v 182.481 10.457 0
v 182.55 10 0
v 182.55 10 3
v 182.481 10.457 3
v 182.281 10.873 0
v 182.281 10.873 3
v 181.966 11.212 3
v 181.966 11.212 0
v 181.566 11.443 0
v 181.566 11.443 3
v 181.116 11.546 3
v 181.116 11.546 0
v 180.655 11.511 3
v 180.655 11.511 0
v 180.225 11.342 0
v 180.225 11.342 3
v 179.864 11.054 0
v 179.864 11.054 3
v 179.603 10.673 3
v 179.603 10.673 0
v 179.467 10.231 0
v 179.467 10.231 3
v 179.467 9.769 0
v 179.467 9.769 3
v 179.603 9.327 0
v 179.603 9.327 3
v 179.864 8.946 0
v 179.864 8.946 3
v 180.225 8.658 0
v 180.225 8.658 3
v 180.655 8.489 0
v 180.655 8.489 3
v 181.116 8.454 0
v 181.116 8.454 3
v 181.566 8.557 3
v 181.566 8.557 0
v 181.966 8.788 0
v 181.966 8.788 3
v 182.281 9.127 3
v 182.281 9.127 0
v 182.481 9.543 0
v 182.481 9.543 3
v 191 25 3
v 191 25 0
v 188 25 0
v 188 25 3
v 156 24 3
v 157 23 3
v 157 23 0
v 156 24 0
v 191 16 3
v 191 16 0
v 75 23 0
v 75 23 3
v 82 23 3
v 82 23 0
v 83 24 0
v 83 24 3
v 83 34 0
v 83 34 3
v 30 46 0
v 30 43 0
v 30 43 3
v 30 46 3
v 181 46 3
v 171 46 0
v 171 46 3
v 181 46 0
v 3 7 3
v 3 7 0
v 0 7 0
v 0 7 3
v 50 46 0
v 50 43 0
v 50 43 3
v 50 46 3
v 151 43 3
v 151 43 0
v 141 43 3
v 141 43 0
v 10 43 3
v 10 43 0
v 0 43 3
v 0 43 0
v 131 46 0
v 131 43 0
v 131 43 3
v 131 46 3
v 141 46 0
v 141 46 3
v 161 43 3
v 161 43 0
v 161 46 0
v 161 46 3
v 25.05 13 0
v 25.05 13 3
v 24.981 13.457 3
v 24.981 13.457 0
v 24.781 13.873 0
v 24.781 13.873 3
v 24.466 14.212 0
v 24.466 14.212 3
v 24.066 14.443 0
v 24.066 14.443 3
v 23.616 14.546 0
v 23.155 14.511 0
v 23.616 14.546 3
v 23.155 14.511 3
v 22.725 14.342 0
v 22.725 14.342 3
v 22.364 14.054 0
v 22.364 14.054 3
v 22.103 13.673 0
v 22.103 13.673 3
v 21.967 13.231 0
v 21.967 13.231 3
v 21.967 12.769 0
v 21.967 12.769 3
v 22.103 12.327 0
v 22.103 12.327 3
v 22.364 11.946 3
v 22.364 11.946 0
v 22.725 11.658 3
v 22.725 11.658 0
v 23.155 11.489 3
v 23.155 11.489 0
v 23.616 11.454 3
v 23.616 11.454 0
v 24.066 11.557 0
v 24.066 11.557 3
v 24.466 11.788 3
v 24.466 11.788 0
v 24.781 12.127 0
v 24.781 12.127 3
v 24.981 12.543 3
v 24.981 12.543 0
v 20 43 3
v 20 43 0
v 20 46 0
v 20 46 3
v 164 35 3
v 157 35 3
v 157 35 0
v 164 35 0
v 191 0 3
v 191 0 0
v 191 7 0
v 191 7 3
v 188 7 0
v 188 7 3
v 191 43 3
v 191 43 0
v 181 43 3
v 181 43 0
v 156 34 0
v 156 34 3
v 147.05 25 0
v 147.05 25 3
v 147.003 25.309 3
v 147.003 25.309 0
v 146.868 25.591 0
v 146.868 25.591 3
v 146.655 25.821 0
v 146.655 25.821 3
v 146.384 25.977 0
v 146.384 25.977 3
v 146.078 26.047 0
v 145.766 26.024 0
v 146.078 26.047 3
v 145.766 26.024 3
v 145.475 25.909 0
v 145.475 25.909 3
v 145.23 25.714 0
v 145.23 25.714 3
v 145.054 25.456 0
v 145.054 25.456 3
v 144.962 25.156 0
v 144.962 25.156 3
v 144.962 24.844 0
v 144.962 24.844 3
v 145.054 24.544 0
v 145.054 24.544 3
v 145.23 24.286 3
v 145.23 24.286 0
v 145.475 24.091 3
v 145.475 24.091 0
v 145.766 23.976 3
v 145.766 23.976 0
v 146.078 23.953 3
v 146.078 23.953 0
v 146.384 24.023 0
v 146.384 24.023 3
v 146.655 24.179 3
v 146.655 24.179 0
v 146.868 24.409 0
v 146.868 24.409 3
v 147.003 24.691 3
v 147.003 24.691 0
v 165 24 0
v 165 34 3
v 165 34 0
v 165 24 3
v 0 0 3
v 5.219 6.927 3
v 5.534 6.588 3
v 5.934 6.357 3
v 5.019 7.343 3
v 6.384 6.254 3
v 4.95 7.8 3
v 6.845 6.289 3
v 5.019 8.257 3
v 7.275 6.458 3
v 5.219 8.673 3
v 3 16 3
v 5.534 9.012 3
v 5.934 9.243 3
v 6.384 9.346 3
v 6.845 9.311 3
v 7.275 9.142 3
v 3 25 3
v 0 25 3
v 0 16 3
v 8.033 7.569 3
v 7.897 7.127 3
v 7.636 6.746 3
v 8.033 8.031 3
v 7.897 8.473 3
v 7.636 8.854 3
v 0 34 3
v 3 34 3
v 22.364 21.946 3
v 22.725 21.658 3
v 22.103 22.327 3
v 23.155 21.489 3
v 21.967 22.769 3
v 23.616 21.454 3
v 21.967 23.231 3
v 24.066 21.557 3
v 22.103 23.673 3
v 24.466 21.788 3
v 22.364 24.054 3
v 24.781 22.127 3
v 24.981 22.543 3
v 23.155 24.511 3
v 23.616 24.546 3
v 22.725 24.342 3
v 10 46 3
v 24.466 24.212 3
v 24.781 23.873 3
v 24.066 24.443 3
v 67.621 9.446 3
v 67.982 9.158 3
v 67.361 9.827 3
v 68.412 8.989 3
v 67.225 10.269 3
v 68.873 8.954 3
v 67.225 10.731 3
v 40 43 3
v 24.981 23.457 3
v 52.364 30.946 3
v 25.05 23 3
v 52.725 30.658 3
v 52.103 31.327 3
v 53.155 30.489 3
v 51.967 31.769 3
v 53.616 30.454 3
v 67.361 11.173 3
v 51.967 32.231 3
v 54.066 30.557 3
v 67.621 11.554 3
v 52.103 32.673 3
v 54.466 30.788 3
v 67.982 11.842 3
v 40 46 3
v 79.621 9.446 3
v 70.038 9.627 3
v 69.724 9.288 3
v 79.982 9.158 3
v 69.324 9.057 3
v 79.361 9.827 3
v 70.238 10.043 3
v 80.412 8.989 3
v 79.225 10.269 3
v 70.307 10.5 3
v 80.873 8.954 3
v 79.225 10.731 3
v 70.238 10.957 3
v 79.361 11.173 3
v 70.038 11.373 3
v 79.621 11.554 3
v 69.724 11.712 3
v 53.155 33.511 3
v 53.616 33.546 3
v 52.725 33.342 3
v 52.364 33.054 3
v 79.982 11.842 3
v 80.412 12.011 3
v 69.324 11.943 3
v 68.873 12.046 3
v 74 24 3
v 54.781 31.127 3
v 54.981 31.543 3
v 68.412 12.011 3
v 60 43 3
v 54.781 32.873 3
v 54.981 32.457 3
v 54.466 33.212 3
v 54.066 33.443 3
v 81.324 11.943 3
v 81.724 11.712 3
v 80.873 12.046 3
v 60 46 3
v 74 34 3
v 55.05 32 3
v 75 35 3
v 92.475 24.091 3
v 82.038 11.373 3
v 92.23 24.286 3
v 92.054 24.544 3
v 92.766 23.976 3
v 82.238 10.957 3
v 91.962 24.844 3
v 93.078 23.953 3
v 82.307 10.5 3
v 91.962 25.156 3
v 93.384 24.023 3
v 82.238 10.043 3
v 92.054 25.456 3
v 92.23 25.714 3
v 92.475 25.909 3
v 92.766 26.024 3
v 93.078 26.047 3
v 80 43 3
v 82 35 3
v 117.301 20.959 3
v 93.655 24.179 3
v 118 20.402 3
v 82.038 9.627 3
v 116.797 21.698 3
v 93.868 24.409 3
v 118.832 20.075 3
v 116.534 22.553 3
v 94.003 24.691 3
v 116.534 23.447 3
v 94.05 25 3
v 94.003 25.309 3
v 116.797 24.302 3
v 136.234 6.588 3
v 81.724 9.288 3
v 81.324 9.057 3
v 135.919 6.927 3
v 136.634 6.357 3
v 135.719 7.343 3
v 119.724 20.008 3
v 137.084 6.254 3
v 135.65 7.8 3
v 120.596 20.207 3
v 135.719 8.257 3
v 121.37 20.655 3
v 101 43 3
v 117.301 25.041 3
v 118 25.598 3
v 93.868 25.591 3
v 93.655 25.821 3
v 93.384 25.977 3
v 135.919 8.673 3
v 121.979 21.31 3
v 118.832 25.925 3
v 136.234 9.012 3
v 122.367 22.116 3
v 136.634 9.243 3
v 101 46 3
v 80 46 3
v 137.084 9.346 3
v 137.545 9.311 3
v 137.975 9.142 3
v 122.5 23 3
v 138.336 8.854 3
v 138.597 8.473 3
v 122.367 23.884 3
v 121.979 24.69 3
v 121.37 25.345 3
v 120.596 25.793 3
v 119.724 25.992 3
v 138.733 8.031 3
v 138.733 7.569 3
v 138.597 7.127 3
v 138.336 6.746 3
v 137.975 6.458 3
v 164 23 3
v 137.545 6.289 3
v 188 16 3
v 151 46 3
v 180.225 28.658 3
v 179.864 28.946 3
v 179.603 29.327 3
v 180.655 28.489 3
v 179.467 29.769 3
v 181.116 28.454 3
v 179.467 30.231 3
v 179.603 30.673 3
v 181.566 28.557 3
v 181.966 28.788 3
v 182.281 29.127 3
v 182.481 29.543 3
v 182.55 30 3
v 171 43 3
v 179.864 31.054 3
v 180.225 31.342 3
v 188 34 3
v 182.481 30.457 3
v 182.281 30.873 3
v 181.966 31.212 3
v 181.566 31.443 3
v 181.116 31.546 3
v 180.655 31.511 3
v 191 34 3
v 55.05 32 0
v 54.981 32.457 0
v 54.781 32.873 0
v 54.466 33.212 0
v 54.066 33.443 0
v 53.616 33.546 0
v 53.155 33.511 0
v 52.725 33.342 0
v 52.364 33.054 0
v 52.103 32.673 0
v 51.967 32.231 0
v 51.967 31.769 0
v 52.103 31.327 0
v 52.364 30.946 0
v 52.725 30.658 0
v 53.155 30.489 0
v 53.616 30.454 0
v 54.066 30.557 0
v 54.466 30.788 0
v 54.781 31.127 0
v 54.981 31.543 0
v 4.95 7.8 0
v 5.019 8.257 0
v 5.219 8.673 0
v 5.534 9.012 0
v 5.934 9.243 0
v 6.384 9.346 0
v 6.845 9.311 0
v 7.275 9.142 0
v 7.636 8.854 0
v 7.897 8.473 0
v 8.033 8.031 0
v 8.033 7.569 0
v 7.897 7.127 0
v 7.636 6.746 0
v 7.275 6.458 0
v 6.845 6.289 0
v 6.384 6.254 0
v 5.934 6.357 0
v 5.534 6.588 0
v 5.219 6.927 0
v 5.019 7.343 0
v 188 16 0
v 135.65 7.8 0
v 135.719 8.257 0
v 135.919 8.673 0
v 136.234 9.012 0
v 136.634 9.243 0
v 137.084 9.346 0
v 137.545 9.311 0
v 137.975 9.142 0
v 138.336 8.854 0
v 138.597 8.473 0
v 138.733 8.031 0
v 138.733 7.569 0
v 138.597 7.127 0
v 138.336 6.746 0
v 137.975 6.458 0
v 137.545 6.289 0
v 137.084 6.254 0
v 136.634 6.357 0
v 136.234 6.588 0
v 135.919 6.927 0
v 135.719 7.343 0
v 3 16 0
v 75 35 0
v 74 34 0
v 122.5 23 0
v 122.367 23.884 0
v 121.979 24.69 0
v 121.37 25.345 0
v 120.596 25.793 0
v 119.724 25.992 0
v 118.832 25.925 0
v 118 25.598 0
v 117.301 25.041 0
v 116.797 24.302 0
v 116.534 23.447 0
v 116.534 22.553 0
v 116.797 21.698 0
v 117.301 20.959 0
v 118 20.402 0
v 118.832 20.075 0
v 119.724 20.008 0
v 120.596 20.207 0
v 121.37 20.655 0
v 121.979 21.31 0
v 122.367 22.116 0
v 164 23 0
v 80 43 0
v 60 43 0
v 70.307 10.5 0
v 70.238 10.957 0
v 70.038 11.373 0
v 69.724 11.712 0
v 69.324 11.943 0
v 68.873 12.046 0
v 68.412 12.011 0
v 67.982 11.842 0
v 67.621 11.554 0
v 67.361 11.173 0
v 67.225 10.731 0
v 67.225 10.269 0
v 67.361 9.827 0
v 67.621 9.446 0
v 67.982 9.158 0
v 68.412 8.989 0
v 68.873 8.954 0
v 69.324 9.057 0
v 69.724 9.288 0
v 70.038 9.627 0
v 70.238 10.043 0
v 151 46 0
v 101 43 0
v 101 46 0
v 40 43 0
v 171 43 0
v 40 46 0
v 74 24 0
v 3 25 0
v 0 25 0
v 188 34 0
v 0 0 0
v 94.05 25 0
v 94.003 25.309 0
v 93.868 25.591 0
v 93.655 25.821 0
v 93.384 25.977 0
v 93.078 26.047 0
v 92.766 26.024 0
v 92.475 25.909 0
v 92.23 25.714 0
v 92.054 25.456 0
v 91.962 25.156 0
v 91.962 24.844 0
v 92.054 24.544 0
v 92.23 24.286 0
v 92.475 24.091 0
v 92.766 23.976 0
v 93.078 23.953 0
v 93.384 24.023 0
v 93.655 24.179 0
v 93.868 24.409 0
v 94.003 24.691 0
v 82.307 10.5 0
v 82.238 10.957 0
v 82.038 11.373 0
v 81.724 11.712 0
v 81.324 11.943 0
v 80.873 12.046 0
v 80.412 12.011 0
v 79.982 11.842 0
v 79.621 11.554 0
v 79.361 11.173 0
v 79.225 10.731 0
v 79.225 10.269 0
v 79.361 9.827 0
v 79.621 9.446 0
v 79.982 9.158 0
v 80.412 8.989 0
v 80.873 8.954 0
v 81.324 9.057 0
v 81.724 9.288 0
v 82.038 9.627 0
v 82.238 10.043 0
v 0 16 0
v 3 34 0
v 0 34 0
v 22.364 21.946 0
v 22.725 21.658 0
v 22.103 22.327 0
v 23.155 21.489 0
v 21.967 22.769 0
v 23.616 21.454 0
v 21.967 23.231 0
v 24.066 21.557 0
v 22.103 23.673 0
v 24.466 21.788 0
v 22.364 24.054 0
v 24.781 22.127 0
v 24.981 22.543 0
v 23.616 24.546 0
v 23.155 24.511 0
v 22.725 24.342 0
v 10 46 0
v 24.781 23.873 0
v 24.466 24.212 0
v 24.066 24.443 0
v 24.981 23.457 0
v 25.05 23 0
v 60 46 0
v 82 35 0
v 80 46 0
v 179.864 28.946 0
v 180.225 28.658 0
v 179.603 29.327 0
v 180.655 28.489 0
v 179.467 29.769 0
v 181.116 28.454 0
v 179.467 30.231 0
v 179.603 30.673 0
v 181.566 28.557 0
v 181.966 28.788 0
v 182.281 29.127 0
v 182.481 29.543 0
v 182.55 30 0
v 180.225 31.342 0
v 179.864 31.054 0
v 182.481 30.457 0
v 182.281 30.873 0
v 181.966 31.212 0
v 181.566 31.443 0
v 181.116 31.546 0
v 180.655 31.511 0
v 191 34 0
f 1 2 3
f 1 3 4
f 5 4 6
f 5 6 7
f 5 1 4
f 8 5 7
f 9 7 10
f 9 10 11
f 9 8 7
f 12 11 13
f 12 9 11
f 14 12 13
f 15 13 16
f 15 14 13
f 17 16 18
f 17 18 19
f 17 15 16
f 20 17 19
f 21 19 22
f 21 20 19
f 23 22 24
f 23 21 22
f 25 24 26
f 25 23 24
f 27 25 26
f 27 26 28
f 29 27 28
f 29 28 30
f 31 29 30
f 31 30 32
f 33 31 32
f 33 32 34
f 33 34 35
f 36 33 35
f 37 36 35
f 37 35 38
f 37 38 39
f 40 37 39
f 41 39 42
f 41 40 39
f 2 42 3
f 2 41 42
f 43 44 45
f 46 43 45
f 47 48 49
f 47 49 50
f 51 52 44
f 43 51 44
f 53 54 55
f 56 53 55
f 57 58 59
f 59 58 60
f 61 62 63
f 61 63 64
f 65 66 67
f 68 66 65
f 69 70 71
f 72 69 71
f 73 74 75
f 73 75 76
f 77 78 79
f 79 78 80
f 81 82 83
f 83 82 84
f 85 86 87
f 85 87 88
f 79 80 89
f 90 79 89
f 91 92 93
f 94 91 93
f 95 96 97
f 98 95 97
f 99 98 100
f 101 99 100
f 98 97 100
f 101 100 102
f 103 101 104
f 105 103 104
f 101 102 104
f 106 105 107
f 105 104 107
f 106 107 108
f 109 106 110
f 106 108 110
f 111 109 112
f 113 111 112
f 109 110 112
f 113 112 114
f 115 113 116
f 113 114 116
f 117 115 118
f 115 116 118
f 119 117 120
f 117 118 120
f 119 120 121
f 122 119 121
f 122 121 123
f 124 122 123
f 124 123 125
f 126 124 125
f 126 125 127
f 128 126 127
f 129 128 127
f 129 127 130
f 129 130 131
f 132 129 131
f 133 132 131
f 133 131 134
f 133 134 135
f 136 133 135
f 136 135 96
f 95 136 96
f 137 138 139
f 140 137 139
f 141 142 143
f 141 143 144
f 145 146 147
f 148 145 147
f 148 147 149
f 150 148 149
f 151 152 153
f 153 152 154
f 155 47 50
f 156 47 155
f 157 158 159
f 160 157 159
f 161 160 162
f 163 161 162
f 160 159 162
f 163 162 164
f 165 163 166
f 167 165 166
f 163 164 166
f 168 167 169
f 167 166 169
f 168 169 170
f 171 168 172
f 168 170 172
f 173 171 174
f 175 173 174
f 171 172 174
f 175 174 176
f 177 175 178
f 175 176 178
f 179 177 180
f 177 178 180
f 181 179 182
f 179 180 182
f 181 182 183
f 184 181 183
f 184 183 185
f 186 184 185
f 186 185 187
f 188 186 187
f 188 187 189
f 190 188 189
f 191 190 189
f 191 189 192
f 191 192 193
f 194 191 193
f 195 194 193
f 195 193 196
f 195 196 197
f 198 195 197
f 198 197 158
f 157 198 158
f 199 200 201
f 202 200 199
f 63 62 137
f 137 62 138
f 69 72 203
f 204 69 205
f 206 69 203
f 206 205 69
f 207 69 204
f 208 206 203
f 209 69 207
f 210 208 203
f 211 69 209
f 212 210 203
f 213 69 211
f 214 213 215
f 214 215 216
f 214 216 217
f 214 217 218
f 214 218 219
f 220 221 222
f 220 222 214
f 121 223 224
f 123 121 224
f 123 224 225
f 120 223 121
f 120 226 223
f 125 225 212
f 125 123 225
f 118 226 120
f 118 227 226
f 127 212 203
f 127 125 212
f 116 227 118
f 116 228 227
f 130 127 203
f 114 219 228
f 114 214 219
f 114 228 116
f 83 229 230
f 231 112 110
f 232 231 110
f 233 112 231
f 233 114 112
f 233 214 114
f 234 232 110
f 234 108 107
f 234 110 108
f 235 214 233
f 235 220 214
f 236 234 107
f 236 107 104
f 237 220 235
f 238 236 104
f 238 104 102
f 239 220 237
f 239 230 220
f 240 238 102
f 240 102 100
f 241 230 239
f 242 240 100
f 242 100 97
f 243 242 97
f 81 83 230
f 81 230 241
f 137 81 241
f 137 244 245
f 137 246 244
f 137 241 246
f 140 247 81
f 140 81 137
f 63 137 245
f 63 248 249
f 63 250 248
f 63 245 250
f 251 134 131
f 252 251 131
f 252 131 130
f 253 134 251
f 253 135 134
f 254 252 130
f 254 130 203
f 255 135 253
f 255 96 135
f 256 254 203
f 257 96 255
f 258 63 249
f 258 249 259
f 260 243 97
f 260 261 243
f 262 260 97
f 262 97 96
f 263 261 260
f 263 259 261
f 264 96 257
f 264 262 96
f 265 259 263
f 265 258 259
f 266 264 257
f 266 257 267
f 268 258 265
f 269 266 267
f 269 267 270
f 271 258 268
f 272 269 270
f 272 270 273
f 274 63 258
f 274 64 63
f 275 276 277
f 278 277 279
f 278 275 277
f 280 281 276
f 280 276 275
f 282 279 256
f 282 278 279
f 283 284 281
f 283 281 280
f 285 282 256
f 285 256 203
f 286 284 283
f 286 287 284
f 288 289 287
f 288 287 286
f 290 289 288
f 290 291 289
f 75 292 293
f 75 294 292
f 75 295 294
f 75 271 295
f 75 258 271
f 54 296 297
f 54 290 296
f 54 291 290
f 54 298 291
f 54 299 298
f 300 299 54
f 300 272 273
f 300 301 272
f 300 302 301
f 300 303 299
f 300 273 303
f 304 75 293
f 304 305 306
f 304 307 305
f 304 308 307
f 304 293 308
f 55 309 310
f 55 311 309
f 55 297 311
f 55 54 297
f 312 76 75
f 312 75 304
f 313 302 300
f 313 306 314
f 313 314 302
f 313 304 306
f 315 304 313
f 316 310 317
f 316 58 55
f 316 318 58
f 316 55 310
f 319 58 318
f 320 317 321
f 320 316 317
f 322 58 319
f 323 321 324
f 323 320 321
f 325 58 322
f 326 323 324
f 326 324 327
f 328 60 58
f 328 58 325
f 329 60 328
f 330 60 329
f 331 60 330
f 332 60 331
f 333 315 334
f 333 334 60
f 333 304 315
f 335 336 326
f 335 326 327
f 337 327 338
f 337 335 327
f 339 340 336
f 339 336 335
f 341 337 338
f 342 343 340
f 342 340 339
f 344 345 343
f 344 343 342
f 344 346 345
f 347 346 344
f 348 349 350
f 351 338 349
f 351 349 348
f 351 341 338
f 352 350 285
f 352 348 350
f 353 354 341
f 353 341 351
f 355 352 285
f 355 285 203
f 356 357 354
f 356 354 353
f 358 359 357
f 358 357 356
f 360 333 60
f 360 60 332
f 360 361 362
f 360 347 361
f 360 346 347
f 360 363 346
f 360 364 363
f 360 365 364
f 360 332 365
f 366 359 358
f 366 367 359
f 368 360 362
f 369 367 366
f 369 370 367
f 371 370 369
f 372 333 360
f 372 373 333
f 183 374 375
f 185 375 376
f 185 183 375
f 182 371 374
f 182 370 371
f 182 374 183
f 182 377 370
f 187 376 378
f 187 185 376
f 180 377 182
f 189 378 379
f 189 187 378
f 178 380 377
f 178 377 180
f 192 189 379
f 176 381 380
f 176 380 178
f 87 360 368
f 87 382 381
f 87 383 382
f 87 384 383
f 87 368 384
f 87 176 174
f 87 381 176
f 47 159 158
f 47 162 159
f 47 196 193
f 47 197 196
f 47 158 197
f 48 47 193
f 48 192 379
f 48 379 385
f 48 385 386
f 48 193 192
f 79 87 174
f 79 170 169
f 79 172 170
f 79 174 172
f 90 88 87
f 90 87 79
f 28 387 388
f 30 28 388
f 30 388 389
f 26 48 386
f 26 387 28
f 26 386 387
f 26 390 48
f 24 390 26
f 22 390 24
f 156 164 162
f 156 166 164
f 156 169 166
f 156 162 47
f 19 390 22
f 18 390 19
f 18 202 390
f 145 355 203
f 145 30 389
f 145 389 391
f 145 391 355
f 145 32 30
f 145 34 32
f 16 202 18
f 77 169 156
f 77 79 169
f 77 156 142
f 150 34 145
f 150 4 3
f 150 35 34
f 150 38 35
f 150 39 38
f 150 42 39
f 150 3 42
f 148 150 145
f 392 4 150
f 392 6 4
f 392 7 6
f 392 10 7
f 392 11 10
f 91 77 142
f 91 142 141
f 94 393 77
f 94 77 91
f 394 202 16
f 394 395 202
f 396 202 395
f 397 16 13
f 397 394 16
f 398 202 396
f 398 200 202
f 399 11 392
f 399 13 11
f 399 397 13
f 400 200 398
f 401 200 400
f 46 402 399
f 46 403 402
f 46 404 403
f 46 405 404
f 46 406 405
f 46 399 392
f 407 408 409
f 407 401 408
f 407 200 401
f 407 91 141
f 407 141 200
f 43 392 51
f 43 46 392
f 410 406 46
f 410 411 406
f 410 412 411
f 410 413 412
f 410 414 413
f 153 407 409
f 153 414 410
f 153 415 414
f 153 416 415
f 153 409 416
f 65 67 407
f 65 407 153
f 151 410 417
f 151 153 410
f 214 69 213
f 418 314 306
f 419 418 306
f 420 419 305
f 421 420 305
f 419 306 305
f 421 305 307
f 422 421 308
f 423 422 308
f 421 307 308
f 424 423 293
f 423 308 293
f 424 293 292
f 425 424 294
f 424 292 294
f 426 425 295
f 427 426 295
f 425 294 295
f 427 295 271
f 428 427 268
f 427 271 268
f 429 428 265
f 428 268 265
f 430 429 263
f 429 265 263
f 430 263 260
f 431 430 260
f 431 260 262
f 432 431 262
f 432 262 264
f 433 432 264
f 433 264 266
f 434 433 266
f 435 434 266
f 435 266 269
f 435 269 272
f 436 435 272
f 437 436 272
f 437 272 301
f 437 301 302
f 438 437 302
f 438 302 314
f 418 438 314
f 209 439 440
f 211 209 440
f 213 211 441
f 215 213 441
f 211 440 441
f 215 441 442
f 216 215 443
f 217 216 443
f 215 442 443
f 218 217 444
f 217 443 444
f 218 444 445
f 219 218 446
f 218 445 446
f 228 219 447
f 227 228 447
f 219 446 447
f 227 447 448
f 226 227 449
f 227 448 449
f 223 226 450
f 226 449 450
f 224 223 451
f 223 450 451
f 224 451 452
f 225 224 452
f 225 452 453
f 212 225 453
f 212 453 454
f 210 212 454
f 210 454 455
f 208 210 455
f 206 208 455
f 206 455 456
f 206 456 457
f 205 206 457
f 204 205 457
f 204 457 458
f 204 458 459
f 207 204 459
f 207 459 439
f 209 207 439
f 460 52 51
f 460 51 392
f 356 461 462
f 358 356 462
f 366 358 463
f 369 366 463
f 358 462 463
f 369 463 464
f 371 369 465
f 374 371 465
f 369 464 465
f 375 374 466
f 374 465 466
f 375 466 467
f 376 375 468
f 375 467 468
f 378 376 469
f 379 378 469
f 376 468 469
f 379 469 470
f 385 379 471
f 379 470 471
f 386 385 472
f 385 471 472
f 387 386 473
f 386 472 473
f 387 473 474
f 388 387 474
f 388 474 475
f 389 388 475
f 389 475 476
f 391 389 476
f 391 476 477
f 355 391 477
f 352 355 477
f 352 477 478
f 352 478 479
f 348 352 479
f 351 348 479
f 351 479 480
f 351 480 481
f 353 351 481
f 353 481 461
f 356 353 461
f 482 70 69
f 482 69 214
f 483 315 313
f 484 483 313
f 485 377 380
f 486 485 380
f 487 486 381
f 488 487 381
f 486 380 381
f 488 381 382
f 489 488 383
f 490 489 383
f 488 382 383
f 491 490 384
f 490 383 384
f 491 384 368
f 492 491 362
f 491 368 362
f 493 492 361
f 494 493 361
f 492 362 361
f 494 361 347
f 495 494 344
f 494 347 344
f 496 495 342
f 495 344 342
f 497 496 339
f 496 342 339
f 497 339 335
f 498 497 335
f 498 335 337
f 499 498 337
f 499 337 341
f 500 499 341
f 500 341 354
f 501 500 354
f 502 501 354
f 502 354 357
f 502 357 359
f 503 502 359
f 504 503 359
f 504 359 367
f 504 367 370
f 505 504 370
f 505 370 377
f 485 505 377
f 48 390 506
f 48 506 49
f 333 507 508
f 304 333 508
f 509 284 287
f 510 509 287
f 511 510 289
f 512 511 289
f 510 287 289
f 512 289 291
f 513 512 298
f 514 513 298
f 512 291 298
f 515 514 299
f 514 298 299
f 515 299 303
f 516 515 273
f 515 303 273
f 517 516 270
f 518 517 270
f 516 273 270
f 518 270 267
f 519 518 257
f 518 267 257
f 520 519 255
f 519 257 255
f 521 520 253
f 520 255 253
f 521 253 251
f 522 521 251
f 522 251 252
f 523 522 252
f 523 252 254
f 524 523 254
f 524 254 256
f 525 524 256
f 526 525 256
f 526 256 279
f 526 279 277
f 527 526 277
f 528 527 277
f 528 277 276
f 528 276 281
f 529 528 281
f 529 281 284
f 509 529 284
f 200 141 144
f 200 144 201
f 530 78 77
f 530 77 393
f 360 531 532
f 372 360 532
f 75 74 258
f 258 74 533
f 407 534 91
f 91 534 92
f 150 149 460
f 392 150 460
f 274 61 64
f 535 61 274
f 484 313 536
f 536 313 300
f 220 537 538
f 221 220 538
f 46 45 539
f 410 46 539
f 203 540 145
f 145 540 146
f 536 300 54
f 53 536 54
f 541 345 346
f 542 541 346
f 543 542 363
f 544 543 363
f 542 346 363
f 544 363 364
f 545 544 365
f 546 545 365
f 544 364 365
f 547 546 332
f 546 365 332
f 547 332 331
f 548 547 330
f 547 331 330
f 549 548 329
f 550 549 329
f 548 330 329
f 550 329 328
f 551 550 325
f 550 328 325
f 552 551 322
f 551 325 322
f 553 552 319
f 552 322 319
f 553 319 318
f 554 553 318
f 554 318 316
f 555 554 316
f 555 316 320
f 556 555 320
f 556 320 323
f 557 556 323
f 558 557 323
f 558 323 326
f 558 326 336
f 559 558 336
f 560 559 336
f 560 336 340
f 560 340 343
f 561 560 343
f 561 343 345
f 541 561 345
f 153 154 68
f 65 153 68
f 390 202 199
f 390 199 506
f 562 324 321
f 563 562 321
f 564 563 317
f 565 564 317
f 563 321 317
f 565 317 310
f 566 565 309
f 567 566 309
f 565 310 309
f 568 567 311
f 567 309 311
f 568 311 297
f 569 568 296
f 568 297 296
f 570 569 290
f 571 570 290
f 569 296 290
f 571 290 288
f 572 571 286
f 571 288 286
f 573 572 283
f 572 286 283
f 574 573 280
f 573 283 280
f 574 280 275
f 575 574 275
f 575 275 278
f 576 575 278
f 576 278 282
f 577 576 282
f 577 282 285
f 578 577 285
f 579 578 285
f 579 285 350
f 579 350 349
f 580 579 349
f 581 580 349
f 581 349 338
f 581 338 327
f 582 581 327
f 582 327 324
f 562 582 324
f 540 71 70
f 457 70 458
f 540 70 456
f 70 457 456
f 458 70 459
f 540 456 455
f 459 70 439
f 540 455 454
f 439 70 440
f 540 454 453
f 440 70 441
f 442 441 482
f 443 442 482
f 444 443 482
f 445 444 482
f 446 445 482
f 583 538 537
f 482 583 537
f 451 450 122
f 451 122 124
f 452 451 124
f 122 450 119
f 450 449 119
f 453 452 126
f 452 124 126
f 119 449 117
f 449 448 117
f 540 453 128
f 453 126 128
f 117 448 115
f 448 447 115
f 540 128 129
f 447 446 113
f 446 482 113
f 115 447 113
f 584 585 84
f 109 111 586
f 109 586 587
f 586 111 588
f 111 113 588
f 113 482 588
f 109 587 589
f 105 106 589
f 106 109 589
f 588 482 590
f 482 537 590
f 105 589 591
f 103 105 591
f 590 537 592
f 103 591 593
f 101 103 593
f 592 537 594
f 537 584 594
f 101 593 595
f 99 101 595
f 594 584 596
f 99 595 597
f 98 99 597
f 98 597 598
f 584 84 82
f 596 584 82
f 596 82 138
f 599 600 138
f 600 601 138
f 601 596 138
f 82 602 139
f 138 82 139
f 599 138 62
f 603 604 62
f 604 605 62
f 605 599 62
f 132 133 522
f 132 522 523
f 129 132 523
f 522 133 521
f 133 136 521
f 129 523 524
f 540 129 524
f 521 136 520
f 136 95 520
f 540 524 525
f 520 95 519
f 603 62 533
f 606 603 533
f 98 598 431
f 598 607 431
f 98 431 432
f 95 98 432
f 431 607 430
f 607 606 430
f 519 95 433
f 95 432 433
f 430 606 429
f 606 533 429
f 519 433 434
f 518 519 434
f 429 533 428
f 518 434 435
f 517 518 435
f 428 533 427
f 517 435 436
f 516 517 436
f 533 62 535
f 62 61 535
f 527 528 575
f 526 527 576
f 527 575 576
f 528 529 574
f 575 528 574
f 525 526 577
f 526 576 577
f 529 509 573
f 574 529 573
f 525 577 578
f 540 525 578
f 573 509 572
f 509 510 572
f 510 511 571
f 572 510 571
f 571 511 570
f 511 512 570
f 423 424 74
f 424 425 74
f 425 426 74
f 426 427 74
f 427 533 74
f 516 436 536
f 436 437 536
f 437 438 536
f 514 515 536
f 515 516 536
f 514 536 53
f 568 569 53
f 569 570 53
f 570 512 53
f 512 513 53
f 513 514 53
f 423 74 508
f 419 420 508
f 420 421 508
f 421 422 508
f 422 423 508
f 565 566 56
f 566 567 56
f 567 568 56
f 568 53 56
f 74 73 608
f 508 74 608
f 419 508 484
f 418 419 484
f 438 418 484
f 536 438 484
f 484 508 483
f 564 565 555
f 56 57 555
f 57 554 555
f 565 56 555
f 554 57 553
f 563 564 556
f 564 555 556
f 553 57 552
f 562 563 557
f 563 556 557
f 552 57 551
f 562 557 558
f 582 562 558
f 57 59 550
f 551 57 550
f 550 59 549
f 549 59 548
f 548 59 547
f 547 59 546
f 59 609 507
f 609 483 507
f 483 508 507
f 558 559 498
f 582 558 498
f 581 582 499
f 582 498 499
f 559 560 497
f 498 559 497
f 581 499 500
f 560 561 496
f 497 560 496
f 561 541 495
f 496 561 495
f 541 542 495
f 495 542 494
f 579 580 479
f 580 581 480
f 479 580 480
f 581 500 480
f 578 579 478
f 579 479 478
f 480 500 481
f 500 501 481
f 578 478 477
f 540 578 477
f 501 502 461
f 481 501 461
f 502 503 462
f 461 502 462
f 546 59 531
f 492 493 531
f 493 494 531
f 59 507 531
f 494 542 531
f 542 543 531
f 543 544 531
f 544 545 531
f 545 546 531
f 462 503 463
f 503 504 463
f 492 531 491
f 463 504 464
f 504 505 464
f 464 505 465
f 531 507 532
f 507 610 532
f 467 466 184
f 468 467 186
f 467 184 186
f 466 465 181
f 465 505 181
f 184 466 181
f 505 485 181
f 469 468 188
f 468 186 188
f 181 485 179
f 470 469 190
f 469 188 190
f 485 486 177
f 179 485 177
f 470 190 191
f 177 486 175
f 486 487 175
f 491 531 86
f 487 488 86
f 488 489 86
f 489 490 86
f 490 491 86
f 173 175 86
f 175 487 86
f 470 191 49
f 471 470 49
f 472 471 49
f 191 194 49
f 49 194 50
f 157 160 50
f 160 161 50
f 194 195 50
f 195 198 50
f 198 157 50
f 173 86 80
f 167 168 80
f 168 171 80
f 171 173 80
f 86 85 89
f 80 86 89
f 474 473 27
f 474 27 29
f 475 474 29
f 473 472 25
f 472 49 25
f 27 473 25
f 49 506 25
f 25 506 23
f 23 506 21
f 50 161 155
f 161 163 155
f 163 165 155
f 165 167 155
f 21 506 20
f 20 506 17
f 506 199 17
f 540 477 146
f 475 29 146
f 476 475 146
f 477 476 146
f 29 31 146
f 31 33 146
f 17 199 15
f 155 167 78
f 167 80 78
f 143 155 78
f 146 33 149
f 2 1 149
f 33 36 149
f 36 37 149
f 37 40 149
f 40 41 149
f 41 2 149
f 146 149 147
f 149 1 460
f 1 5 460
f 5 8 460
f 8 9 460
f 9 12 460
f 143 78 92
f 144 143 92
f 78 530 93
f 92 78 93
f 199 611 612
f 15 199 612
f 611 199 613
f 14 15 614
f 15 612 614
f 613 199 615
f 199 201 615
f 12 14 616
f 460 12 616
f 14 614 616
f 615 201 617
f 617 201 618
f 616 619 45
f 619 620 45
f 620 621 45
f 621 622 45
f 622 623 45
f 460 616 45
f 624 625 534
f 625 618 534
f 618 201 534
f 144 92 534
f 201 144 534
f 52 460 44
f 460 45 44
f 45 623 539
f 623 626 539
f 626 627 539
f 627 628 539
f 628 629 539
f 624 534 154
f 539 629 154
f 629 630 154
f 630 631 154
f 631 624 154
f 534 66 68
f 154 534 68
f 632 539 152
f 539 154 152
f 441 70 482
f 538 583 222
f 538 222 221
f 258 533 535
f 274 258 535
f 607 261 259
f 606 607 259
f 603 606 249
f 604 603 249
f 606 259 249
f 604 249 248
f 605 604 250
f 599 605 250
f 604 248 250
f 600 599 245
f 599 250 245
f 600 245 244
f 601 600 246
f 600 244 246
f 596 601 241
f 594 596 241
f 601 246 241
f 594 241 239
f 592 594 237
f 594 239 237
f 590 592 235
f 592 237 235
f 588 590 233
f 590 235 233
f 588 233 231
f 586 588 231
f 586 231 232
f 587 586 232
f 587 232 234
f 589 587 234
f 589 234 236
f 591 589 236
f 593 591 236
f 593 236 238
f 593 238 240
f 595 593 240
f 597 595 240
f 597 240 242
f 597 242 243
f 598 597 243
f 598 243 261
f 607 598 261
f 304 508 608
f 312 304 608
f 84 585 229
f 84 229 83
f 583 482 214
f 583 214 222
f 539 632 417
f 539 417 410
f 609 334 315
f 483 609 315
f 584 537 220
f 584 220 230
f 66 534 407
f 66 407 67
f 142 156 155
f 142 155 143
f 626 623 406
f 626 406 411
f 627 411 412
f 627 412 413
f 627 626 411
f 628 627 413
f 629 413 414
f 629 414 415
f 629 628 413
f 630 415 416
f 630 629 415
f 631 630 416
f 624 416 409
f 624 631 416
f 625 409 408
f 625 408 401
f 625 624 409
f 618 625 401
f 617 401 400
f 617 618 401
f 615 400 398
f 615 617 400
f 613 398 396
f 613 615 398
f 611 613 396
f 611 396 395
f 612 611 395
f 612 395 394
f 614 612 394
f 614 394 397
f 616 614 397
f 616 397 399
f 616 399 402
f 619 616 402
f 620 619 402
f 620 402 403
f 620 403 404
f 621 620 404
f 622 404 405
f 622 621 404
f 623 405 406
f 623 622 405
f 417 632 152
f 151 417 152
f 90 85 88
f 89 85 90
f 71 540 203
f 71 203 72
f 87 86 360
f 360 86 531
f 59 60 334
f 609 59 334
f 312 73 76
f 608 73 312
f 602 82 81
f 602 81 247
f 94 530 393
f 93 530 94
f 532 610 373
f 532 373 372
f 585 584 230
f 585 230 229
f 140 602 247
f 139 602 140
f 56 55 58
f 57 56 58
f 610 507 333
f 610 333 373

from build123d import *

# Parameters (mm, degrees)
SKETCH1_W           = 191
SKETCH1_H           = 46
SKETCH1_R           = 1.549999948
BOSS_EXTRUDE1_DEPTH = 3
CUT_EXTRUDE1_REACH  = 5
SKETCH4_W           = 10
SKETCH4_H           = 3
SKETCH4_W_2         = 20
SKETCH4_W_3         = 30
CUT_EXTRUDE2_REACH  = 5
SKETCH5_W           = 3
SKETCH5_H           = 9
CUT_EXTRUDE3_REACH  = 5
SKETCH6_W           = 3
SKETCH6_H           = 9
CUT_EXTRUDE4_REACH  = 5
SKETCH7_R           = 3
CUT_EXTRUDE5_REACH  = 5
SKETCH8_R           = 1.55
CUT_EXTRUDE6_REACH  = 5
SKETCH9_R           = 1.55
CUT_EXTRUDE7_REACH  = 5
SKETCH10_R          = 1.05
CUT_EXTRUDE8_REACH  = 5
SKETCH11_R          = 1.05


with BuildPart() as part:
    # Sketch1 → Boss-Extrude1 (new body)
    with BuildSketch(Plane.XY):
        with Locations((95.5, 23)):
            Rectangle(SKETCH1_W, SKETCH1_H)
        with Locations((181, 30)):
            Circle(SKETCH1_R, mode=Mode.SUBTRACT)
        with Locations((181, 10)):
            Circle(SKETCH1_R, mode=Mode.SUBTRACT)
    extrude(amount=BOSS_EXTRUDE1_DEPTH)

    # Sketch4 → Cut-Extrude1 (cut, up to next)
    with BuildSketch(Plane(origin=(0, 0, 0), x_dir=(-1, 0, 0), z_dir=(0, 0, -1)), mode=Mode.PRIVATE) as cut_extrude1_sk1:
        with Locations((-5, 44.5)):
            Rectangle(SKETCH4_W, SKETCH4_H)
    cut_extrude1_tool1 = extrude(cut_extrude1_sk1.sketch, amount=-CUT_EXTRUDE1_REACH, mode=Mode.PRIVATE) & part.part
    add(cut_extrude1_tool1.solids().sort_by_distance((5, 44.5, 0))[0], mode=Mode.SUBTRACT)
    # Sketch4 → Cut-Extrude1 (cut, up to next)
    with BuildSketch(Plane(origin=(0, 0, 0), x_dir=(-1, 0, 0), z_dir=(0, 0, -1)), mode=Mode.PRIVATE) as cut_extrude1_sk2:
        with Locations((-25, 44.5)):
            Rectangle(SKETCH4_W, SKETCH4_H)
    cut_extrude1_tool2 = extrude(cut_extrude1_sk2.sketch, amount=-CUT_EXTRUDE1_REACH, mode=Mode.PRIVATE) & part.part
    add(cut_extrude1_tool2.solids().sort_by_distance((25, 44.5, 0))[0], mode=Mode.SUBTRACT)
    # Sketch4 → Cut-Extrude1 (cut, up to next)
    with BuildSketch(Plane(origin=(0, 0, 0), x_dir=(-1, 0, 0), z_dir=(0, 0, -1)), mode=Mode.PRIVATE) as cut_extrude1_sk3:
        with Locations((-45, 44.5)):
            Rectangle(SKETCH4_W, SKETCH4_H)
    cut_extrude1_tool3 = extrude(cut_extrude1_sk3.sketch, amount=-CUT_EXTRUDE1_REACH, mode=Mode.PRIVATE) & part.part
    add(cut_extrude1_tool3.solids().sort_by_distance((45, 44.5, 0))[0], mode=Mode.SUBTRACT)
    # Sketch4 → Cut-Extrude1 (cut, up to next)
    with BuildSketch(Plane(origin=(0, 0, 0), x_dir=(-1, 0, 0), z_dir=(0, 0, -1)), mode=Mode.PRIVATE) as cut_extrude1_sk4:
        with Locations((-70, 44.5)):
            Rectangle(SKETCH4_W_2, SKETCH4_H)
    cut_extrude1_tool4 = extrude(cut_extrude1_sk4.sketch, amount=-CUT_EXTRUDE1_REACH, mode=Mode.PRIVATE) & part.part
    add(cut_extrude1_tool4.solids().sort_by_distance((70, 44.5, 0))[0], mode=Mode.SUBTRACT)
    # Sketch4 → Cut-Extrude1 (cut, up to next)
    with BuildSketch(Plane(origin=(0, 0, 0), x_dir=(-1, 0, 0), z_dir=(0, 0, -1)), mode=Mode.PRIVATE) as cut_extrude1_sk5:
        with Locations((-116, 44.5)):
            Rectangle(SKETCH4_W_3, SKETCH4_H)
    cut_extrude1_tool5 = extrude(cut_extrude1_sk5.sketch, amount=-CUT_EXTRUDE1_REACH, mode=Mode.PRIVATE) & part.part
    add(cut_extrude1_tool5.solids().sort_by_distance((116, 44.5, 0))[0], mode=Mode.SUBTRACT)
    # Sketch4 → Cut-Extrude1 (cut, up to next)
    with BuildSketch(Plane(origin=(0, 0, 0), x_dir=(-1, 0, 0), z_dir=(0, 0, -1)), mode=Mode.PRIVATE) as cut_extrude1_sk6:
        with Locations((-146, 44.5)):
            Rectangle(SKETCH4_W, SKETCH4_H)
    cut_extrude1_tool6 = extrude(cut_extrude1_sk6.sketch, amount=-CUT_EXTRUDE1_REACH, mode=Mode.PRIVATE) & part.part
    add(cut_extrude1_tool6.solids().sort_by_distance((146, 44.5, 0))[0], mode=Mode.SUBTRACT)
    # Sketch4 → Cut-Extrude1 (cut, up to next)
    with BuildSketch(Plane(origin=(0, 0, 0), x_dir=(-1, 0, 0), z_dir=(0, 0, -1)), mode=Mode.PRIVATE) as cut_extrude1_sk7:
        with Locations((-166, 44.5)):
            Rectangle(SKETCH4_W, SKETCH4_H)
    cut_extrude1_tool7 = extrude(cut_extrude1_sk7.sketch, amount=-CUT_EXTRUDE1_REACH, mode=Mode.PRIVATE) & part.part
    add(cut_extrude1_tool7.solids().sort_by_distance((166, 44.5, 0))[0], mode=Mode.SUBTRACT)
    # Sketch4 → Cut-Extrude1 (cut, up to next)
    with BuildSketch(Plane(origin=(0, 0, 0), x_dir=(-1, 0, 0), z_dir=(0, 0, -1)), mode=Mode.PRIVATE) as cut_extrude1_sk8:
        with Locations((-186, 44.5)):
            Rectangle(SKETCH4_W, SKETCH4_H)
    cut_extrude1_tool8 = extrude(cut_extrude1_sk8.sketch, amount=-CUT_EXTRUDE1_REACH, mode=Mode.PRIVATE) & part.part
    add(cut_extrude1_tool8.solids().sort_by_distance((186, 44.5, 0))[0], mode=Mode.SUBTRACT)

    # Sketch5 → Cut-Extrude2 (cut, up to next)
    with BuildSketch(Plane(origin=(0, 0, 0), x_dir=(-1, 0, 0), z_dir=(0, 0, -1)), mode=Mode.PRIVATE) as cut_extrude2_sk1:
        with Locations((-1.5, 29.5)):
            Rectangle(SKETCH5_W, SKETCH5_H)
    cut_extrude2_tool1 = extrude(cut_extrude2_sk1.sketch, amount=-CUT_EXTRUDE2_REACH, mode=Mode.PRIVATE) & part.part
    add(cut_extrude2_tool1.solids().sort_by_distance((1.5, 29.5, 0))[0], mode=Mode.SUBTRACT)
    # Sketch5 → Cut-Extrude2 (cut, up to next)
    with BuildSketch(Plane(origin=(0, 0, 0), x_dir=(-1, 0, 0), z_dir=(0, 0, -1)), mode=Mode.PRIVATE) as cut_extrude2_sk2:
        with Locations((-1.5, 11.5)):
            Rectangle(SKETCH5_W, SKETCH5_H)
    cut_extrude2_tool2 = extrude(cut_extrude2_sk2.sketch, amount=-CUT_EXTRUDE2_REACH, mode=Mode.PRIVATE) & part.part
    add(cut_extrude2_tool2.solids().sort_by_distance((1.5, 11.5, 0))[0], mode=Mode.SUBTRACT)

    # Sketch6 → Cut-Extrude3 (cut, up to next)
    with BuildSketch(Plane(origin=(0, 0, 0), x_dir=(-1, 0, 0), z_dir=(0, 0, -1)), mode=Mode.PRIVATE) as cut_extrude3_sk1:
        with Locations((-189.5, 29.5)):
            Rectangle(SKETCH6_W, SKETCH6_H)
    cut_extrude3_tool1 = extrude(cut_extrude3_sk1.sketch, amount=-CUT_EXTRUDE3_REACH, mode=Mode.PRIVATE) & part.part
    add(cut_extrude3_tool1.solids().sort_by_distance((189.5, 29.5, 0))[0], mode=Mode.SUBTRACT)
    # Sketch6 → Cut-Extrude3 (cut, up to next)
    with BuildSketch(Plane(origin=(0, 0, 0), x_dir=(-1, 0, 0), z_dir=(0, 0, -1)), mode=Mode.PRIVATE) as cut_extrude3_sk2:
        with Locations((-189.5, 11.5)):
            Rectangle(SKETCH6_W, SKETCH6_H)
    cut_extrude3_tool2 = extrude(cut_extrude3_sk2.sketch, amount=-CUT_EXTRUDE3_REACH, mode=Mode.PRIVATE) & part.part
    add(cut_extrude3_tool2.solids().sort_by_distance((189.5, 11.5, 0))[0], mode=Mode.SUBTRACT)

    # Sketch7 → Cut-Extrude4 (cut, up to next)
    with BuildSketch(Plane.XY.offset(3), mode=Mode.PRIVATE) as cut_extrude4_sk1:
        with Locations((119.5, 23)):
            Circle(SKETCH7_R)
    cut_extrude4_tool1 = extrude(cut_extrude4_sk1.sketch, amount=-CUT_EXTRUDE4_REACH, mode=Mode.PRIVATE) & part.part
    add(cut_extrude4_tool1.solids().sort_by_distance((119.5, 23, 3))[0], mode=Mode.SUBTRACT)

    # Sketch8 → Cut-Extrude5 (cut, up to next)
    with BuildSketch(Plane.XY.offset(3), mode=Mode.PRIVATE) as cut_extrude5_sk1:
        with Locations((23.5, 13)):
            Circle(SKETCH8_R)
    cut_extrude5_tool1 = extrude(cut_extrude5_sk1.sketch, amount=-CUT_EXTRUDE5_REACH, mode=Mode.PRIVATE) & part.part
    add(cut_extrude5_tool1.solids().sort_by_distance((23.5, 13, 3))[0], mode=Mode.SUBTRACT)
    # Sketch8 → Cut-Extrude5 (cut, up to next)
    with BuildSketch(Plane.XY.offset(3), mode=Mode.PRIVATE) as cut_extrude5_sk2:
        with Locations((23.5, 23)):
            Circle(SKETCH8_R)
    cut_extrude5_tool2 = extrude(cut_extrude5_sk2.sketch, amount=-CUT_EXTRUDE5_REACH, mode=Mode.PRIVATE) & part.part
    add(cut_extrude5_tool2.solids().sort_by_distance((23.5, 23, 3))[0], mode=Mode.SUBTRACT)
    # Sketch8 → Cut-Extrude5 (cut, up to next)
    with BuildSketch(Plane.XY.offset(3), mode=Mode.PRIVATE) as cut_extrude5_sk3:
        with Locations((53.5, 32)):
            Circle(SKETCH8_R)
    cut_extrude5_tool3 = extrude(cut_extrude5_sk3.sketch, amount=-CUT_EXTRUDE5_REACH, mode=Mode.PRIVATE) & part.part
    add(cut_extrude5_tool3.solids().sort_by_distance((53.5, 32, 3))[0], mode=Mode.SUBTRACT)
    # Sketch8 → Cut-Extrude5 (cut, up to next)
    with BuildSketch(Plane.XY.offset(3), mode=Mode.PRIVATE) as cut_extrude5_sk4:
        with Locations((68.757359313, 10.5)):
            Circle(SKETCH8_R)
    cut_extrude5_tool4 = extrude(cut_extrude5_sk4.sketch, amount=-CUT_EXTRUDE5_REACH, mode=Mode.PRIVATE) & part.part
    add(cut_extrude5_tool4.solids().sort_by_distance((68.757359, 10.5, 3))[0], mode=Mode.SUBTRACT)
    # Sketch8 → Cut-Extrude5 (cut, up to next)
    with BuildSketch(Plane.XY.offset(3), mode=Mode.PRIVATE) as cut_extrude5_sk5:
        with Locations((80.757359313, 10.5)):
            Circle(SKETCH8_R)
    cut_extrude5_tool5 = extrude(cut_extrude5_sk5.sketch, amount=-CUT_EXTRUDE5_REACH, mode=Mode.PRIVATE) & part.part
    add(cut_extrude5_tool5.solids().sort_by_distance((80.757359, 10.5, 3))[0], mode=Mode.SUBTRACT)

    # Sketch9 → Cut-Extrude6 (cut, up to next)
    with BuildSketch(Plane(origin=(0, 0, 0), x_dir=(-1, 0, 0), z_dir=(0, 0, -1)), mode=Mode.PRIVATE) as cut_extrude6_sk1:
        with Locations((-137.2, 7.8)):
            Circle(SKETCH9_R)
    cut_extrude6_tool1 = extrude(cut_extrude6_sk1.sketch, amount=-CUT_EXTRUDE6_REACH, mode=Mode.PRIVATE) & part.part
    add(cut_extrude6_tool1.solids().sort_by_distance((137.2, 7.8, 0))[0], mode=Mode.SUBTRACT)
    # Sketch9 → Cut-Extrude6 (cut, up to next)
    with BuildSketch(Plane(origin=(0, 0, 0), x_dir=(-1, 0, 0), z_dir=(0, 0, -1)), mode=Mode.PRIVATE) as cut_extrude6_sk2:
        with Locations((-6.5, 7.8)):
            Circle(SKETCH9_R)
    cut_extrude6_tool2 = extrude(cut_extrude6_sk2.sketch, amount=-CUT_EXTRUDE6_REACH, mode=Mode.PRIVATE) & part.part
    add(cut_extrude6_tool2.solids().sort_by_distance((6.5, 7.8, 0))[0], mode=Mode.SUBTRACT)

    # Sketch10 → Cut-Extrude7 (cut, up to next)
    with BuildSketch(Plane.XY.offset(3), mode=Mode.PRIVATE) as cut_extrude7_sk1:
        with Locations((93, 25)):
            Circle(SKETCH10_R)
    cut_extrude7_tool1 = extrude(cut_extrude7_sk1.sketch, amount=-CUT_EXTRUDE7_REACH, mode=Mode.PRIVATE) & part.part
    add(cut_extrude7_tool1.solids().sort_by_distance((93, 25, 3))[0], mode=Mode.SUBTRACT)
    # Sketch10 → Cut-Extrude7 (cut, up to next)
    with BuildSketch(Plane.XY.offset(3), mode=Mode.PRIVATE) as cut_extrude7_sk2:
        Polygon((83, 24), (83, 34), (82, 35), (75, 35), (74, 34), (74, 24), (75, 23), (82, 23), align=None)
    cut_extrude7_tool2 = extrude(cut_extrude7_sk2.sketch, amount=-CUT_EXTRUDE7_REACH, mode=Mode.PRIVATE) & part.part
    add(cut_extrude7_tool2.solids().sort_by_distance((78.5, 29, 3))[0], mode=Mode.SUBTRACT)

    # Sketch11 → Cut-Extrude8 (cut, up to next)
    with BuildSketch(Plane.XY.offset(3), mode=Mode.PRIVATE) as cut_extrude8_sk1:
        Polygon((164, 23), (157, 23), (156, 24), (156, 34), (157, 35), (164, 35), (165, 34), (165, 24), align=None)
    cut_extrude8_tool1 = extrude(cut_extrude8_sk1.sketch, amount=-CUT_EXTRUDE8_REACH, mode=Mode.PRIVATE) & part.part
    add(cut_extrude8_tool1.solids().sort_by_distance((160.5, 29, 3))[0], mode=Mode.SUBTRACT)
    # Sketch11 → Cut-Extrude8 (cut, up to next)
    with BuildSketch(Plane.XY.offset(3), mode=Mode.PRIVATE) as cut_extrude8_sk2:
        with Locations((146, 25)):
            Circle(SKETCH11_R)
    cut_extrude8_tool2 = extrude(cut_extrude8_sk2.sketch, amount=-CUT_EXTRUDE8_REACH, mode=Mode.PRIVATE) & part.part
    add(cut_extrude8_tool2.solids().sort_by_distance((146, 25, 3))[0], mode=Mode.SUBTRACT)


solid = part.part
